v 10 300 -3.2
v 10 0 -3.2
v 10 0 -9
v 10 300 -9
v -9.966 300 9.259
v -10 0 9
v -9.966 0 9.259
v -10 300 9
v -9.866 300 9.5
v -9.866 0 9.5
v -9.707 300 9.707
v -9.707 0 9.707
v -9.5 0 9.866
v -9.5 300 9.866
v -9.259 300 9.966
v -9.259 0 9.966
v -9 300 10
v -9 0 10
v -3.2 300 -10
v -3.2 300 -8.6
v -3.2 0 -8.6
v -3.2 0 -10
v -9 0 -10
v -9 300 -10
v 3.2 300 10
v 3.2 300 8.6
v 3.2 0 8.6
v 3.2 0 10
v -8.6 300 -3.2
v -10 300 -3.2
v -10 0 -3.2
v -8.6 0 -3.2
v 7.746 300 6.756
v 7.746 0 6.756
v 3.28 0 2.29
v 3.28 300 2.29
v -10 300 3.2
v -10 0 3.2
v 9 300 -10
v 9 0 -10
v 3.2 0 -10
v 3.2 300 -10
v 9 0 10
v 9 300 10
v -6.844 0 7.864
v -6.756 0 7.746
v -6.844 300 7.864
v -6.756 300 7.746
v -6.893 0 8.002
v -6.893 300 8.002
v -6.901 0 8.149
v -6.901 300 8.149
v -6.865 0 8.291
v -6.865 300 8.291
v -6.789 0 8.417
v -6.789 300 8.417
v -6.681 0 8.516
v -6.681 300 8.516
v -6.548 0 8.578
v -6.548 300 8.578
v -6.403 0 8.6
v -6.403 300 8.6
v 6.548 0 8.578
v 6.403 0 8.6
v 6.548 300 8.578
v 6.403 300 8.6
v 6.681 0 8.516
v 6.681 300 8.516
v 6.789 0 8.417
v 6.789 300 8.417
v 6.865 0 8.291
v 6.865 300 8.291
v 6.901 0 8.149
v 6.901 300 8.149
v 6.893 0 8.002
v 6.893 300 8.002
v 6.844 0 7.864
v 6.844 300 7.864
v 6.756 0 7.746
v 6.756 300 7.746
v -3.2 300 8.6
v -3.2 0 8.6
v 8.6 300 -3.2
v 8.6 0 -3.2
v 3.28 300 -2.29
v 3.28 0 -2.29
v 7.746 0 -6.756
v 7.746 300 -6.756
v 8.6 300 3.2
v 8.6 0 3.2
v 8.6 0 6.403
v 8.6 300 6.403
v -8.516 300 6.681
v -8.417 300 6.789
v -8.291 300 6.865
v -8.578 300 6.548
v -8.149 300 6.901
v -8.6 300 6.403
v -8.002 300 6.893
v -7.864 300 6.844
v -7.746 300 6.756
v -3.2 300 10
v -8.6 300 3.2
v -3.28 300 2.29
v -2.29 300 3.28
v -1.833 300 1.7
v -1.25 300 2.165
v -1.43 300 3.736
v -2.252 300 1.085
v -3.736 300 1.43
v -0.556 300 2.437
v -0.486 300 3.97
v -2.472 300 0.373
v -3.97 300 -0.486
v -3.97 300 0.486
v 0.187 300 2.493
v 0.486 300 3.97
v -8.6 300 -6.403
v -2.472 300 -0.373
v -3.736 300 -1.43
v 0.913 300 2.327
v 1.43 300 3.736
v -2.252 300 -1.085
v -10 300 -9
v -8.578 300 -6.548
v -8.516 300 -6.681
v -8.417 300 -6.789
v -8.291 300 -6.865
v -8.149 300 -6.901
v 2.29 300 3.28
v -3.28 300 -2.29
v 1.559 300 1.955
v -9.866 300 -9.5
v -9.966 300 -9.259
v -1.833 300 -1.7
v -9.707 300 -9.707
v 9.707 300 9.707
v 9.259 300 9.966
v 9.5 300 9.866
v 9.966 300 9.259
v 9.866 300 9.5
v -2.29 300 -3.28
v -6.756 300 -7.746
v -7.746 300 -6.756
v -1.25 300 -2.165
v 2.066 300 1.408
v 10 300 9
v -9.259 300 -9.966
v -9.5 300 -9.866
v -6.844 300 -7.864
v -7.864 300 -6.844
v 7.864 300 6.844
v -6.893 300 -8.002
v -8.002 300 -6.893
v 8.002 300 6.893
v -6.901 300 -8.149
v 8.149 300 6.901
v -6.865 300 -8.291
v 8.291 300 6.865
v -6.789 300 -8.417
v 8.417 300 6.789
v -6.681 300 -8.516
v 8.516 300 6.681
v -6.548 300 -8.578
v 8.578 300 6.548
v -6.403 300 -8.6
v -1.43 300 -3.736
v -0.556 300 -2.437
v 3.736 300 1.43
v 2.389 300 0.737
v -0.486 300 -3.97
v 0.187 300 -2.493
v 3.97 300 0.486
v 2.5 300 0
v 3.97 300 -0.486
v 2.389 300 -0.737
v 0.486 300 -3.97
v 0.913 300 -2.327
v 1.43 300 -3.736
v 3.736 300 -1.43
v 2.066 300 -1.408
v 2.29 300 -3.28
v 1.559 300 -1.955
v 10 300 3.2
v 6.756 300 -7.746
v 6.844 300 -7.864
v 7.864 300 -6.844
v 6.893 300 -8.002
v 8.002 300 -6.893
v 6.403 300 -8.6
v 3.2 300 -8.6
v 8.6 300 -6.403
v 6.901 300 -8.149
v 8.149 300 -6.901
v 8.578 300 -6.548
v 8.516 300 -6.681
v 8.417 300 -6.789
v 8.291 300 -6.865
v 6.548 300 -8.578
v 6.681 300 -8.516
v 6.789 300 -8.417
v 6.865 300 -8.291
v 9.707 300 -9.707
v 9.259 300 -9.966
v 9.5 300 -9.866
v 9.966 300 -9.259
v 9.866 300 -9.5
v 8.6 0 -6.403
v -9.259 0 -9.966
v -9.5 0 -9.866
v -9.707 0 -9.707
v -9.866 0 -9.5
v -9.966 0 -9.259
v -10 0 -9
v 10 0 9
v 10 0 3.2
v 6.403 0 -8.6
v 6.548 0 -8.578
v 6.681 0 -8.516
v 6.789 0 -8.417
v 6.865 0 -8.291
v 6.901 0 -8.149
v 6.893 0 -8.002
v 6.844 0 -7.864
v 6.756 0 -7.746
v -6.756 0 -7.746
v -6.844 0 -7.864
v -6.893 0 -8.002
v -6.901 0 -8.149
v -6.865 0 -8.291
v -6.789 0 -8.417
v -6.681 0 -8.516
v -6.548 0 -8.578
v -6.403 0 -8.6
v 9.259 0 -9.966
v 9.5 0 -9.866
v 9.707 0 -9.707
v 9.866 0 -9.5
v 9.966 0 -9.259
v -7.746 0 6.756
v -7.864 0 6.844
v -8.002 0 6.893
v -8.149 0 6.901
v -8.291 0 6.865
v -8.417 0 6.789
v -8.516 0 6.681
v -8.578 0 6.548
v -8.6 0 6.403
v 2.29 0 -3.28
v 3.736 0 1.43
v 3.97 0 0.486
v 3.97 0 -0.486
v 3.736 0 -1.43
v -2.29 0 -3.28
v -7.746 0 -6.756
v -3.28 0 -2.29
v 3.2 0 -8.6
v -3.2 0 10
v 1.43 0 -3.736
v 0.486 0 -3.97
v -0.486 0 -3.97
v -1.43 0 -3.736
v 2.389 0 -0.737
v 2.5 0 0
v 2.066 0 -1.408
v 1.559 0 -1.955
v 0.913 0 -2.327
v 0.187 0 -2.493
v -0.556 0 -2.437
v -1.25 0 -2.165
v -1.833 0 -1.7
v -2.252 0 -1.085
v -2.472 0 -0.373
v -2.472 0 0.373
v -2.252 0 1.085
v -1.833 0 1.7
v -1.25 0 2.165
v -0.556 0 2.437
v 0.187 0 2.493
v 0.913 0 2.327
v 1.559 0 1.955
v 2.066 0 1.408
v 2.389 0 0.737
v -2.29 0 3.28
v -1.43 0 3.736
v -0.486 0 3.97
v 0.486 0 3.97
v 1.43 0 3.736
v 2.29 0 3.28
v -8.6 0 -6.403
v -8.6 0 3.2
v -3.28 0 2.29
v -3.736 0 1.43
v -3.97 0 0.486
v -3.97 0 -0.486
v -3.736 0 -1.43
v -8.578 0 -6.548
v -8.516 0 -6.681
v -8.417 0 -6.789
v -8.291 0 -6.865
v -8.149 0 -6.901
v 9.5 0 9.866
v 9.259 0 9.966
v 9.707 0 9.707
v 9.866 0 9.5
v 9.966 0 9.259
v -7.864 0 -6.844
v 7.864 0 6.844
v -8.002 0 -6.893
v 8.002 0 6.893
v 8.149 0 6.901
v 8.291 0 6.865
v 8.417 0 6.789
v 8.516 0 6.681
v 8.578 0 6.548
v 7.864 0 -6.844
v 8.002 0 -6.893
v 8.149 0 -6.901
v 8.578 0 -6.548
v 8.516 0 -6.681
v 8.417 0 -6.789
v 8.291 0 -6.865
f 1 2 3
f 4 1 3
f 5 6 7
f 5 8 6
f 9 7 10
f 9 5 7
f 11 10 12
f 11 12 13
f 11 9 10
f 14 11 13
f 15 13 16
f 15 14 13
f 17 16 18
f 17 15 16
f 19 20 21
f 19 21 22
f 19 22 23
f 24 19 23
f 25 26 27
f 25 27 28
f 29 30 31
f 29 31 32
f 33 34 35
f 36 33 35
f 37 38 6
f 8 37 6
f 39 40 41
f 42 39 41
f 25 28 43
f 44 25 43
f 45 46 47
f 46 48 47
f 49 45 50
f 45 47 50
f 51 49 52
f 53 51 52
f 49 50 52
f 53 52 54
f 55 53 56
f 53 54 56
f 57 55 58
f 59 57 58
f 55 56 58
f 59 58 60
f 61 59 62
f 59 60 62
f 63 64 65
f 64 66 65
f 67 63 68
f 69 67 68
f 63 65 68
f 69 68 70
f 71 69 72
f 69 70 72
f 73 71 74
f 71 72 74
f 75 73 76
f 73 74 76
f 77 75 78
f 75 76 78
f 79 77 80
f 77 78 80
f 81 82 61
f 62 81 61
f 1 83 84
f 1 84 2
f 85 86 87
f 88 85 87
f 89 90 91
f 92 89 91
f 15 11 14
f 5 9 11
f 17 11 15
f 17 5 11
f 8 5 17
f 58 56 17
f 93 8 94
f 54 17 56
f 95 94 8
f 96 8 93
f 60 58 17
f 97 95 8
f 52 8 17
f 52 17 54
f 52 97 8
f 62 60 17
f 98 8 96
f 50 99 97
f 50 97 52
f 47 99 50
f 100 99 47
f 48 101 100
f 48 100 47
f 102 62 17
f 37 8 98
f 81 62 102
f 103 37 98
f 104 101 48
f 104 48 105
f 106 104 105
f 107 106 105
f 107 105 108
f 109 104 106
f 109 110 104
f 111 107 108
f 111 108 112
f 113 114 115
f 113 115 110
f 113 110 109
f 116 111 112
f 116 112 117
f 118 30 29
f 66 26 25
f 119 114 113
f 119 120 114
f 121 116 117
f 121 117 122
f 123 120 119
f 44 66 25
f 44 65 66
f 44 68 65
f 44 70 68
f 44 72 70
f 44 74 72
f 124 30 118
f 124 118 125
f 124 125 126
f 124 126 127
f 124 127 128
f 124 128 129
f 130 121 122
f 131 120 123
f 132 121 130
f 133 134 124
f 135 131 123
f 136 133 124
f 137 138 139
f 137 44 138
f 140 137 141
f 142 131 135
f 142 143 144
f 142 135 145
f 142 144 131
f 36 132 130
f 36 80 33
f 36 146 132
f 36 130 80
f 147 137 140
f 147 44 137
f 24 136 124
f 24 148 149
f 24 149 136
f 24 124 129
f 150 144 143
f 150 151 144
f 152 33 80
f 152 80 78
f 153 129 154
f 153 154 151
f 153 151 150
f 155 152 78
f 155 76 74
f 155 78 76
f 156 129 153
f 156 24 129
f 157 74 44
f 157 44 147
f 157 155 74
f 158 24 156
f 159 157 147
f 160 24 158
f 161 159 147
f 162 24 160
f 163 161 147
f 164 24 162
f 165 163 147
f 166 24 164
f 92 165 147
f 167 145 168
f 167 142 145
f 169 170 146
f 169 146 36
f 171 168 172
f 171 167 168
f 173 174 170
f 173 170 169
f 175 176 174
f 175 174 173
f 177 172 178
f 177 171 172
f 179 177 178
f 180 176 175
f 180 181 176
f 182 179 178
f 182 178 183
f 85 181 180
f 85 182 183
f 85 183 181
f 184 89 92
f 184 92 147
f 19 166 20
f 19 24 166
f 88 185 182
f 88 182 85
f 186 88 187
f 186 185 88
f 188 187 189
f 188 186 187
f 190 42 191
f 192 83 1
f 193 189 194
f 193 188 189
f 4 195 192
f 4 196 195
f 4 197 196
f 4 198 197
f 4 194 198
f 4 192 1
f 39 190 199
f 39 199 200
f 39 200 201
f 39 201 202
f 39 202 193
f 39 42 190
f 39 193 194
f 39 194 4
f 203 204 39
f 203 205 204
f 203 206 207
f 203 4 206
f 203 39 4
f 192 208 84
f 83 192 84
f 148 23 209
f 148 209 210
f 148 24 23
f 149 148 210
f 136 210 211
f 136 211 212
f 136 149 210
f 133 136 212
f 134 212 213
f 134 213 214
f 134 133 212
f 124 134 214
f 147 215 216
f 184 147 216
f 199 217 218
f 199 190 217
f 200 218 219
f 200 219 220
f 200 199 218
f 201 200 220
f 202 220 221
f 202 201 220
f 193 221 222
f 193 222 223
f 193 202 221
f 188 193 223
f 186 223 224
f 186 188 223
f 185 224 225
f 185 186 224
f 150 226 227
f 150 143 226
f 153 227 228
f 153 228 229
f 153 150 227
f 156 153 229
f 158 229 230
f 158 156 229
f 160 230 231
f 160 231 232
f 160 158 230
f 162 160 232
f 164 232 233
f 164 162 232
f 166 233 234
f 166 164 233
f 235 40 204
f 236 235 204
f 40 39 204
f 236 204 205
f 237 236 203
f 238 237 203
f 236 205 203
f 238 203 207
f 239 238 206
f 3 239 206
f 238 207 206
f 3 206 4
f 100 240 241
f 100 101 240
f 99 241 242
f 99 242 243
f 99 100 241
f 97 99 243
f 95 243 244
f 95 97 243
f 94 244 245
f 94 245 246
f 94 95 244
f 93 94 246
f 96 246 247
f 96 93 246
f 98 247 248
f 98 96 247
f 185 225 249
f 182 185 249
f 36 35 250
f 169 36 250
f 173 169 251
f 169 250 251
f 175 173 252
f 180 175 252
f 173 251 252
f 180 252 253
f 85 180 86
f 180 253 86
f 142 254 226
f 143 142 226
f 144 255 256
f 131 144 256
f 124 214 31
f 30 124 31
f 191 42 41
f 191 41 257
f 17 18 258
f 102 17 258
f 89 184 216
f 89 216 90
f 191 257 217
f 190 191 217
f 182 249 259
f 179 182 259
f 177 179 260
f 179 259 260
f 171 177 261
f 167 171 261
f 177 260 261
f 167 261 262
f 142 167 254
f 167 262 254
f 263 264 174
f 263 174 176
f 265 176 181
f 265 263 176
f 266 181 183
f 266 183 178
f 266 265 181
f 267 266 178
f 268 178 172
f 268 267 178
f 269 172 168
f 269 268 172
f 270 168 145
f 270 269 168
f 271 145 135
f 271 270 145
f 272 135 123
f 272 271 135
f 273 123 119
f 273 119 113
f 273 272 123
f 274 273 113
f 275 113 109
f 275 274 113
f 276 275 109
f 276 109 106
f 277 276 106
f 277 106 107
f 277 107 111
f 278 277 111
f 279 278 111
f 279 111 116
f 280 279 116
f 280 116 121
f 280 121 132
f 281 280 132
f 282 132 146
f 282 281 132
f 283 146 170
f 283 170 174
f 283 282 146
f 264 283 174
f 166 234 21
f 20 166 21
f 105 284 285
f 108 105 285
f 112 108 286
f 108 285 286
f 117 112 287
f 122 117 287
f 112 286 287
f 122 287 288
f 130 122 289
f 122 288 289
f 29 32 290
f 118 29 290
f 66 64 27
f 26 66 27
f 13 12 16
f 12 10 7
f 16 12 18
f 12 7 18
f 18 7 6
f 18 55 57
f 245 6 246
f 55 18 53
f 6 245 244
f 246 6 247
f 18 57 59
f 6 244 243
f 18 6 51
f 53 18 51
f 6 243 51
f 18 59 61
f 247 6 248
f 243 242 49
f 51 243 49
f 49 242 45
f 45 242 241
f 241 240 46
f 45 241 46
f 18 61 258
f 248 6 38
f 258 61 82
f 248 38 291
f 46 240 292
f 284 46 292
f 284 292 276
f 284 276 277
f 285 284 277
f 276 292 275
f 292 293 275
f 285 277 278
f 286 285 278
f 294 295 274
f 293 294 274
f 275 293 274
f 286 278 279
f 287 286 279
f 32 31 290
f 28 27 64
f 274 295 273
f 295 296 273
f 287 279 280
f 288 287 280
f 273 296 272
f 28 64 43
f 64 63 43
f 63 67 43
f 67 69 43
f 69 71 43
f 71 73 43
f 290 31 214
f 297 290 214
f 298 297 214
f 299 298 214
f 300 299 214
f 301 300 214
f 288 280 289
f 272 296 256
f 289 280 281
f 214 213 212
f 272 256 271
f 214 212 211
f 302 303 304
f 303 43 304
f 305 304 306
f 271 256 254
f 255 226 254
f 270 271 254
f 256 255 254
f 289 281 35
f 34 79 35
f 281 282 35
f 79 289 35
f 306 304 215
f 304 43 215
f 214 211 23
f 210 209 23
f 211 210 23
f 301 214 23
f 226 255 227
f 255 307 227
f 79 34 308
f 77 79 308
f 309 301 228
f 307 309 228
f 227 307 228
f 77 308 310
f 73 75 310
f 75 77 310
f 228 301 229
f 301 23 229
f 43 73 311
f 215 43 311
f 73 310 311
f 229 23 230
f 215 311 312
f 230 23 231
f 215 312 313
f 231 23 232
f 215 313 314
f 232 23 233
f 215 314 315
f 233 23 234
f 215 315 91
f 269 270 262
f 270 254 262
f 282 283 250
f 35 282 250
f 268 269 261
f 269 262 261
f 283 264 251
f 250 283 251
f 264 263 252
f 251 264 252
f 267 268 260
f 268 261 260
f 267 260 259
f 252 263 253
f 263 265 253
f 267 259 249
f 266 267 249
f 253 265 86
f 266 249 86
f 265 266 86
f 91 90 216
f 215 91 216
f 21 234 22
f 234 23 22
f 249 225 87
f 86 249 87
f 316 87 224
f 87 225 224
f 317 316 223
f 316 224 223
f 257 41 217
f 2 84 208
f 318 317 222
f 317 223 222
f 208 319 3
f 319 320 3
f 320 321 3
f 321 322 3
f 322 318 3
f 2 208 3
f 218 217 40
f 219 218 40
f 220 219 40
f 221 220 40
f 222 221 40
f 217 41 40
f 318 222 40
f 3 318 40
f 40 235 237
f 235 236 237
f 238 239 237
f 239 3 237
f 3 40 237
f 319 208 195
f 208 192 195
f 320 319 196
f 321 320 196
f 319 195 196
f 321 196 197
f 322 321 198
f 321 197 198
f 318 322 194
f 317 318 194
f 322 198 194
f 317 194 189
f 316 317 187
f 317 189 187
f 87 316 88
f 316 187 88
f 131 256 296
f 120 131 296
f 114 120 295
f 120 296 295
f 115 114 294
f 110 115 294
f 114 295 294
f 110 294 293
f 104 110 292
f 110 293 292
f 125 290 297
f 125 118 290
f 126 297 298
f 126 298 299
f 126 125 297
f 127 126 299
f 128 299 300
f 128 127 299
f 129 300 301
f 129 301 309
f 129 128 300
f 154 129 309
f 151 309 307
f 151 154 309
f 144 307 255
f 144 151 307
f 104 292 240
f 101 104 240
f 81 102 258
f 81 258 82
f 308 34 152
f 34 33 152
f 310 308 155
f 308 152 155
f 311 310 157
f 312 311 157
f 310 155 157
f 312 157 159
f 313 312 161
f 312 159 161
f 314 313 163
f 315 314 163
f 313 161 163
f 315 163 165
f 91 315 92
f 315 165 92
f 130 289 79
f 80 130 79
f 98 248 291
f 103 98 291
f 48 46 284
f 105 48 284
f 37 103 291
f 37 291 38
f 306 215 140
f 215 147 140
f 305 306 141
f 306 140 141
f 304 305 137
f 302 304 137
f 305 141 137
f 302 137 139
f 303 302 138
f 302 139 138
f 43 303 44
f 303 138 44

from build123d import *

# Parameters (mm, degrees)
SKETCH1_R           = 2.5
BOSS_EXTRUDE1_DEPTH = 300
FILLET1_R           = 0.5
FILLET2_R           = 1


with BuildPart() as part:
    # Sketch1 → Boss-Extrude1 (new body)
    with BuildSketch(Plane(origin=(0, 0, 0), x_dir=(1, 0, 0), z_dir=(0, 1, 0))):
        with BuildLine():
            Line((3.2, 10), (3.2, 8.6))
            Line((3.2, 8.6), (7.610050506, 8.6))
            Line((7.610050506, 8.6), (2.289805316, 3.27975481))
            ThreePointArc((2.289805316, 3.27975481), (0, 4), (-2.289805316, 3.27975481))
            Line((-2.289805316, 3.27975481), (-7.610050506, 8.6))
            Line((-7.610050506, 8.6), (-3.2, 8.6))
            Line((-3.2, 8.6), (-3.2, 10))
            Line((-3.2, 10), (-10, 10))
            Line((-10, 10), (-10, 3.2))
            Line((-10, 3.2), (-8.6, 3.2))
            Line((-8.6, 3.2), (-8.6, 7.610050506))
            Line((-8.6, 7.610050506), (-3.27975481, 2.289805316))
            ThreePointArc((-3.27975481, 2.289805316), (-4, 0), (-3.27975481, -2.289805316))
            Line((-3.27975481, -2.289805316), (-8.6, -7.610050506))
            Line((-8.6, -7.610050506), (-8.6, -3.2))
            Line((-8.6, -3.2), (-10, -3.2))
            Line((-10, -3.2), (-10, -10))
            Line((-10, -10), (-3.2, -10))
            Line((-3.2, -10), (-3.2, -8.6))
            Line((-3.2, -8.6), (-7.610050506, -8.6))
            Line((-7.610050506, -8.6), (-2.289805316, -3.27975481))
            ThreePointArc((-2.289805316, -3.27975481), (0, -4), (2.289805316, -3.27975481))
            Line((2.289805316, -3.27975481), (7.610050506, -8.6))
            Line((7.610050506, -8.6), (3.2, -8.6))
            Line((3.2, -8.6), (3.2, -10))
            Line((3.2, -10), (10, -10))
            Line((10, -10), (10, -3.2))
            Line((10, -3.2), (8.6, -3.2))
            Line((8.6, -3.2), (8.6, -7.610050506))
            Line((8.6, -7.610050506), (3.27975481, -2.289805316))
            ThreePointArc((3.27975481, -2.289805316), (4, 0), (3.27975481, 2.289805316))
            Line((3.27975481, 2.289805316), (8.6, 7.610050506))
            Line((8.6, 7.610050506), (8.6, 3.2))
            Line((8.6, 3.2), (10, 3.2))
            Line((10, 3.2), (10, 10))
            Line((10, 10), (3.2, 10))
        make_face()
        Circle(SKETCH1_R, mode=Mode.SUBTRACT)
    extrude(amount=BOSS_EXTRUDE1_DEPTH)

    # Fillet1
    fillet1_edges = [part.edges().sort_by_distance(p)[0] for p in [
        (8.6, 150, -7.610050506),
        (8.6, 150, 7.610050506),
        (7.610050506, 150, 8.6),
        (-7.610050506, 150, 8.6),
        (-8.6, 150, 7.610050506),
        (-8.6, 150, -7.610050506),
        (-7.610050506, 150, -8.6),
        (7.610050506, 150, -8.6),
    ]]
    fillet(fillet1_edges, radius=FILLET1_R)

    # Fillet2
    fillet2_edges = [part.edges().sort_by_distance(p)[0] for p in [
        (10, 150, 10),
        (-10, 150, 10),
        (-10, 150, -10),
        (10, 150, -10),
    ]]
    fillet(fillet2_edges, radius=FILLET2_R)


solid = part.part
